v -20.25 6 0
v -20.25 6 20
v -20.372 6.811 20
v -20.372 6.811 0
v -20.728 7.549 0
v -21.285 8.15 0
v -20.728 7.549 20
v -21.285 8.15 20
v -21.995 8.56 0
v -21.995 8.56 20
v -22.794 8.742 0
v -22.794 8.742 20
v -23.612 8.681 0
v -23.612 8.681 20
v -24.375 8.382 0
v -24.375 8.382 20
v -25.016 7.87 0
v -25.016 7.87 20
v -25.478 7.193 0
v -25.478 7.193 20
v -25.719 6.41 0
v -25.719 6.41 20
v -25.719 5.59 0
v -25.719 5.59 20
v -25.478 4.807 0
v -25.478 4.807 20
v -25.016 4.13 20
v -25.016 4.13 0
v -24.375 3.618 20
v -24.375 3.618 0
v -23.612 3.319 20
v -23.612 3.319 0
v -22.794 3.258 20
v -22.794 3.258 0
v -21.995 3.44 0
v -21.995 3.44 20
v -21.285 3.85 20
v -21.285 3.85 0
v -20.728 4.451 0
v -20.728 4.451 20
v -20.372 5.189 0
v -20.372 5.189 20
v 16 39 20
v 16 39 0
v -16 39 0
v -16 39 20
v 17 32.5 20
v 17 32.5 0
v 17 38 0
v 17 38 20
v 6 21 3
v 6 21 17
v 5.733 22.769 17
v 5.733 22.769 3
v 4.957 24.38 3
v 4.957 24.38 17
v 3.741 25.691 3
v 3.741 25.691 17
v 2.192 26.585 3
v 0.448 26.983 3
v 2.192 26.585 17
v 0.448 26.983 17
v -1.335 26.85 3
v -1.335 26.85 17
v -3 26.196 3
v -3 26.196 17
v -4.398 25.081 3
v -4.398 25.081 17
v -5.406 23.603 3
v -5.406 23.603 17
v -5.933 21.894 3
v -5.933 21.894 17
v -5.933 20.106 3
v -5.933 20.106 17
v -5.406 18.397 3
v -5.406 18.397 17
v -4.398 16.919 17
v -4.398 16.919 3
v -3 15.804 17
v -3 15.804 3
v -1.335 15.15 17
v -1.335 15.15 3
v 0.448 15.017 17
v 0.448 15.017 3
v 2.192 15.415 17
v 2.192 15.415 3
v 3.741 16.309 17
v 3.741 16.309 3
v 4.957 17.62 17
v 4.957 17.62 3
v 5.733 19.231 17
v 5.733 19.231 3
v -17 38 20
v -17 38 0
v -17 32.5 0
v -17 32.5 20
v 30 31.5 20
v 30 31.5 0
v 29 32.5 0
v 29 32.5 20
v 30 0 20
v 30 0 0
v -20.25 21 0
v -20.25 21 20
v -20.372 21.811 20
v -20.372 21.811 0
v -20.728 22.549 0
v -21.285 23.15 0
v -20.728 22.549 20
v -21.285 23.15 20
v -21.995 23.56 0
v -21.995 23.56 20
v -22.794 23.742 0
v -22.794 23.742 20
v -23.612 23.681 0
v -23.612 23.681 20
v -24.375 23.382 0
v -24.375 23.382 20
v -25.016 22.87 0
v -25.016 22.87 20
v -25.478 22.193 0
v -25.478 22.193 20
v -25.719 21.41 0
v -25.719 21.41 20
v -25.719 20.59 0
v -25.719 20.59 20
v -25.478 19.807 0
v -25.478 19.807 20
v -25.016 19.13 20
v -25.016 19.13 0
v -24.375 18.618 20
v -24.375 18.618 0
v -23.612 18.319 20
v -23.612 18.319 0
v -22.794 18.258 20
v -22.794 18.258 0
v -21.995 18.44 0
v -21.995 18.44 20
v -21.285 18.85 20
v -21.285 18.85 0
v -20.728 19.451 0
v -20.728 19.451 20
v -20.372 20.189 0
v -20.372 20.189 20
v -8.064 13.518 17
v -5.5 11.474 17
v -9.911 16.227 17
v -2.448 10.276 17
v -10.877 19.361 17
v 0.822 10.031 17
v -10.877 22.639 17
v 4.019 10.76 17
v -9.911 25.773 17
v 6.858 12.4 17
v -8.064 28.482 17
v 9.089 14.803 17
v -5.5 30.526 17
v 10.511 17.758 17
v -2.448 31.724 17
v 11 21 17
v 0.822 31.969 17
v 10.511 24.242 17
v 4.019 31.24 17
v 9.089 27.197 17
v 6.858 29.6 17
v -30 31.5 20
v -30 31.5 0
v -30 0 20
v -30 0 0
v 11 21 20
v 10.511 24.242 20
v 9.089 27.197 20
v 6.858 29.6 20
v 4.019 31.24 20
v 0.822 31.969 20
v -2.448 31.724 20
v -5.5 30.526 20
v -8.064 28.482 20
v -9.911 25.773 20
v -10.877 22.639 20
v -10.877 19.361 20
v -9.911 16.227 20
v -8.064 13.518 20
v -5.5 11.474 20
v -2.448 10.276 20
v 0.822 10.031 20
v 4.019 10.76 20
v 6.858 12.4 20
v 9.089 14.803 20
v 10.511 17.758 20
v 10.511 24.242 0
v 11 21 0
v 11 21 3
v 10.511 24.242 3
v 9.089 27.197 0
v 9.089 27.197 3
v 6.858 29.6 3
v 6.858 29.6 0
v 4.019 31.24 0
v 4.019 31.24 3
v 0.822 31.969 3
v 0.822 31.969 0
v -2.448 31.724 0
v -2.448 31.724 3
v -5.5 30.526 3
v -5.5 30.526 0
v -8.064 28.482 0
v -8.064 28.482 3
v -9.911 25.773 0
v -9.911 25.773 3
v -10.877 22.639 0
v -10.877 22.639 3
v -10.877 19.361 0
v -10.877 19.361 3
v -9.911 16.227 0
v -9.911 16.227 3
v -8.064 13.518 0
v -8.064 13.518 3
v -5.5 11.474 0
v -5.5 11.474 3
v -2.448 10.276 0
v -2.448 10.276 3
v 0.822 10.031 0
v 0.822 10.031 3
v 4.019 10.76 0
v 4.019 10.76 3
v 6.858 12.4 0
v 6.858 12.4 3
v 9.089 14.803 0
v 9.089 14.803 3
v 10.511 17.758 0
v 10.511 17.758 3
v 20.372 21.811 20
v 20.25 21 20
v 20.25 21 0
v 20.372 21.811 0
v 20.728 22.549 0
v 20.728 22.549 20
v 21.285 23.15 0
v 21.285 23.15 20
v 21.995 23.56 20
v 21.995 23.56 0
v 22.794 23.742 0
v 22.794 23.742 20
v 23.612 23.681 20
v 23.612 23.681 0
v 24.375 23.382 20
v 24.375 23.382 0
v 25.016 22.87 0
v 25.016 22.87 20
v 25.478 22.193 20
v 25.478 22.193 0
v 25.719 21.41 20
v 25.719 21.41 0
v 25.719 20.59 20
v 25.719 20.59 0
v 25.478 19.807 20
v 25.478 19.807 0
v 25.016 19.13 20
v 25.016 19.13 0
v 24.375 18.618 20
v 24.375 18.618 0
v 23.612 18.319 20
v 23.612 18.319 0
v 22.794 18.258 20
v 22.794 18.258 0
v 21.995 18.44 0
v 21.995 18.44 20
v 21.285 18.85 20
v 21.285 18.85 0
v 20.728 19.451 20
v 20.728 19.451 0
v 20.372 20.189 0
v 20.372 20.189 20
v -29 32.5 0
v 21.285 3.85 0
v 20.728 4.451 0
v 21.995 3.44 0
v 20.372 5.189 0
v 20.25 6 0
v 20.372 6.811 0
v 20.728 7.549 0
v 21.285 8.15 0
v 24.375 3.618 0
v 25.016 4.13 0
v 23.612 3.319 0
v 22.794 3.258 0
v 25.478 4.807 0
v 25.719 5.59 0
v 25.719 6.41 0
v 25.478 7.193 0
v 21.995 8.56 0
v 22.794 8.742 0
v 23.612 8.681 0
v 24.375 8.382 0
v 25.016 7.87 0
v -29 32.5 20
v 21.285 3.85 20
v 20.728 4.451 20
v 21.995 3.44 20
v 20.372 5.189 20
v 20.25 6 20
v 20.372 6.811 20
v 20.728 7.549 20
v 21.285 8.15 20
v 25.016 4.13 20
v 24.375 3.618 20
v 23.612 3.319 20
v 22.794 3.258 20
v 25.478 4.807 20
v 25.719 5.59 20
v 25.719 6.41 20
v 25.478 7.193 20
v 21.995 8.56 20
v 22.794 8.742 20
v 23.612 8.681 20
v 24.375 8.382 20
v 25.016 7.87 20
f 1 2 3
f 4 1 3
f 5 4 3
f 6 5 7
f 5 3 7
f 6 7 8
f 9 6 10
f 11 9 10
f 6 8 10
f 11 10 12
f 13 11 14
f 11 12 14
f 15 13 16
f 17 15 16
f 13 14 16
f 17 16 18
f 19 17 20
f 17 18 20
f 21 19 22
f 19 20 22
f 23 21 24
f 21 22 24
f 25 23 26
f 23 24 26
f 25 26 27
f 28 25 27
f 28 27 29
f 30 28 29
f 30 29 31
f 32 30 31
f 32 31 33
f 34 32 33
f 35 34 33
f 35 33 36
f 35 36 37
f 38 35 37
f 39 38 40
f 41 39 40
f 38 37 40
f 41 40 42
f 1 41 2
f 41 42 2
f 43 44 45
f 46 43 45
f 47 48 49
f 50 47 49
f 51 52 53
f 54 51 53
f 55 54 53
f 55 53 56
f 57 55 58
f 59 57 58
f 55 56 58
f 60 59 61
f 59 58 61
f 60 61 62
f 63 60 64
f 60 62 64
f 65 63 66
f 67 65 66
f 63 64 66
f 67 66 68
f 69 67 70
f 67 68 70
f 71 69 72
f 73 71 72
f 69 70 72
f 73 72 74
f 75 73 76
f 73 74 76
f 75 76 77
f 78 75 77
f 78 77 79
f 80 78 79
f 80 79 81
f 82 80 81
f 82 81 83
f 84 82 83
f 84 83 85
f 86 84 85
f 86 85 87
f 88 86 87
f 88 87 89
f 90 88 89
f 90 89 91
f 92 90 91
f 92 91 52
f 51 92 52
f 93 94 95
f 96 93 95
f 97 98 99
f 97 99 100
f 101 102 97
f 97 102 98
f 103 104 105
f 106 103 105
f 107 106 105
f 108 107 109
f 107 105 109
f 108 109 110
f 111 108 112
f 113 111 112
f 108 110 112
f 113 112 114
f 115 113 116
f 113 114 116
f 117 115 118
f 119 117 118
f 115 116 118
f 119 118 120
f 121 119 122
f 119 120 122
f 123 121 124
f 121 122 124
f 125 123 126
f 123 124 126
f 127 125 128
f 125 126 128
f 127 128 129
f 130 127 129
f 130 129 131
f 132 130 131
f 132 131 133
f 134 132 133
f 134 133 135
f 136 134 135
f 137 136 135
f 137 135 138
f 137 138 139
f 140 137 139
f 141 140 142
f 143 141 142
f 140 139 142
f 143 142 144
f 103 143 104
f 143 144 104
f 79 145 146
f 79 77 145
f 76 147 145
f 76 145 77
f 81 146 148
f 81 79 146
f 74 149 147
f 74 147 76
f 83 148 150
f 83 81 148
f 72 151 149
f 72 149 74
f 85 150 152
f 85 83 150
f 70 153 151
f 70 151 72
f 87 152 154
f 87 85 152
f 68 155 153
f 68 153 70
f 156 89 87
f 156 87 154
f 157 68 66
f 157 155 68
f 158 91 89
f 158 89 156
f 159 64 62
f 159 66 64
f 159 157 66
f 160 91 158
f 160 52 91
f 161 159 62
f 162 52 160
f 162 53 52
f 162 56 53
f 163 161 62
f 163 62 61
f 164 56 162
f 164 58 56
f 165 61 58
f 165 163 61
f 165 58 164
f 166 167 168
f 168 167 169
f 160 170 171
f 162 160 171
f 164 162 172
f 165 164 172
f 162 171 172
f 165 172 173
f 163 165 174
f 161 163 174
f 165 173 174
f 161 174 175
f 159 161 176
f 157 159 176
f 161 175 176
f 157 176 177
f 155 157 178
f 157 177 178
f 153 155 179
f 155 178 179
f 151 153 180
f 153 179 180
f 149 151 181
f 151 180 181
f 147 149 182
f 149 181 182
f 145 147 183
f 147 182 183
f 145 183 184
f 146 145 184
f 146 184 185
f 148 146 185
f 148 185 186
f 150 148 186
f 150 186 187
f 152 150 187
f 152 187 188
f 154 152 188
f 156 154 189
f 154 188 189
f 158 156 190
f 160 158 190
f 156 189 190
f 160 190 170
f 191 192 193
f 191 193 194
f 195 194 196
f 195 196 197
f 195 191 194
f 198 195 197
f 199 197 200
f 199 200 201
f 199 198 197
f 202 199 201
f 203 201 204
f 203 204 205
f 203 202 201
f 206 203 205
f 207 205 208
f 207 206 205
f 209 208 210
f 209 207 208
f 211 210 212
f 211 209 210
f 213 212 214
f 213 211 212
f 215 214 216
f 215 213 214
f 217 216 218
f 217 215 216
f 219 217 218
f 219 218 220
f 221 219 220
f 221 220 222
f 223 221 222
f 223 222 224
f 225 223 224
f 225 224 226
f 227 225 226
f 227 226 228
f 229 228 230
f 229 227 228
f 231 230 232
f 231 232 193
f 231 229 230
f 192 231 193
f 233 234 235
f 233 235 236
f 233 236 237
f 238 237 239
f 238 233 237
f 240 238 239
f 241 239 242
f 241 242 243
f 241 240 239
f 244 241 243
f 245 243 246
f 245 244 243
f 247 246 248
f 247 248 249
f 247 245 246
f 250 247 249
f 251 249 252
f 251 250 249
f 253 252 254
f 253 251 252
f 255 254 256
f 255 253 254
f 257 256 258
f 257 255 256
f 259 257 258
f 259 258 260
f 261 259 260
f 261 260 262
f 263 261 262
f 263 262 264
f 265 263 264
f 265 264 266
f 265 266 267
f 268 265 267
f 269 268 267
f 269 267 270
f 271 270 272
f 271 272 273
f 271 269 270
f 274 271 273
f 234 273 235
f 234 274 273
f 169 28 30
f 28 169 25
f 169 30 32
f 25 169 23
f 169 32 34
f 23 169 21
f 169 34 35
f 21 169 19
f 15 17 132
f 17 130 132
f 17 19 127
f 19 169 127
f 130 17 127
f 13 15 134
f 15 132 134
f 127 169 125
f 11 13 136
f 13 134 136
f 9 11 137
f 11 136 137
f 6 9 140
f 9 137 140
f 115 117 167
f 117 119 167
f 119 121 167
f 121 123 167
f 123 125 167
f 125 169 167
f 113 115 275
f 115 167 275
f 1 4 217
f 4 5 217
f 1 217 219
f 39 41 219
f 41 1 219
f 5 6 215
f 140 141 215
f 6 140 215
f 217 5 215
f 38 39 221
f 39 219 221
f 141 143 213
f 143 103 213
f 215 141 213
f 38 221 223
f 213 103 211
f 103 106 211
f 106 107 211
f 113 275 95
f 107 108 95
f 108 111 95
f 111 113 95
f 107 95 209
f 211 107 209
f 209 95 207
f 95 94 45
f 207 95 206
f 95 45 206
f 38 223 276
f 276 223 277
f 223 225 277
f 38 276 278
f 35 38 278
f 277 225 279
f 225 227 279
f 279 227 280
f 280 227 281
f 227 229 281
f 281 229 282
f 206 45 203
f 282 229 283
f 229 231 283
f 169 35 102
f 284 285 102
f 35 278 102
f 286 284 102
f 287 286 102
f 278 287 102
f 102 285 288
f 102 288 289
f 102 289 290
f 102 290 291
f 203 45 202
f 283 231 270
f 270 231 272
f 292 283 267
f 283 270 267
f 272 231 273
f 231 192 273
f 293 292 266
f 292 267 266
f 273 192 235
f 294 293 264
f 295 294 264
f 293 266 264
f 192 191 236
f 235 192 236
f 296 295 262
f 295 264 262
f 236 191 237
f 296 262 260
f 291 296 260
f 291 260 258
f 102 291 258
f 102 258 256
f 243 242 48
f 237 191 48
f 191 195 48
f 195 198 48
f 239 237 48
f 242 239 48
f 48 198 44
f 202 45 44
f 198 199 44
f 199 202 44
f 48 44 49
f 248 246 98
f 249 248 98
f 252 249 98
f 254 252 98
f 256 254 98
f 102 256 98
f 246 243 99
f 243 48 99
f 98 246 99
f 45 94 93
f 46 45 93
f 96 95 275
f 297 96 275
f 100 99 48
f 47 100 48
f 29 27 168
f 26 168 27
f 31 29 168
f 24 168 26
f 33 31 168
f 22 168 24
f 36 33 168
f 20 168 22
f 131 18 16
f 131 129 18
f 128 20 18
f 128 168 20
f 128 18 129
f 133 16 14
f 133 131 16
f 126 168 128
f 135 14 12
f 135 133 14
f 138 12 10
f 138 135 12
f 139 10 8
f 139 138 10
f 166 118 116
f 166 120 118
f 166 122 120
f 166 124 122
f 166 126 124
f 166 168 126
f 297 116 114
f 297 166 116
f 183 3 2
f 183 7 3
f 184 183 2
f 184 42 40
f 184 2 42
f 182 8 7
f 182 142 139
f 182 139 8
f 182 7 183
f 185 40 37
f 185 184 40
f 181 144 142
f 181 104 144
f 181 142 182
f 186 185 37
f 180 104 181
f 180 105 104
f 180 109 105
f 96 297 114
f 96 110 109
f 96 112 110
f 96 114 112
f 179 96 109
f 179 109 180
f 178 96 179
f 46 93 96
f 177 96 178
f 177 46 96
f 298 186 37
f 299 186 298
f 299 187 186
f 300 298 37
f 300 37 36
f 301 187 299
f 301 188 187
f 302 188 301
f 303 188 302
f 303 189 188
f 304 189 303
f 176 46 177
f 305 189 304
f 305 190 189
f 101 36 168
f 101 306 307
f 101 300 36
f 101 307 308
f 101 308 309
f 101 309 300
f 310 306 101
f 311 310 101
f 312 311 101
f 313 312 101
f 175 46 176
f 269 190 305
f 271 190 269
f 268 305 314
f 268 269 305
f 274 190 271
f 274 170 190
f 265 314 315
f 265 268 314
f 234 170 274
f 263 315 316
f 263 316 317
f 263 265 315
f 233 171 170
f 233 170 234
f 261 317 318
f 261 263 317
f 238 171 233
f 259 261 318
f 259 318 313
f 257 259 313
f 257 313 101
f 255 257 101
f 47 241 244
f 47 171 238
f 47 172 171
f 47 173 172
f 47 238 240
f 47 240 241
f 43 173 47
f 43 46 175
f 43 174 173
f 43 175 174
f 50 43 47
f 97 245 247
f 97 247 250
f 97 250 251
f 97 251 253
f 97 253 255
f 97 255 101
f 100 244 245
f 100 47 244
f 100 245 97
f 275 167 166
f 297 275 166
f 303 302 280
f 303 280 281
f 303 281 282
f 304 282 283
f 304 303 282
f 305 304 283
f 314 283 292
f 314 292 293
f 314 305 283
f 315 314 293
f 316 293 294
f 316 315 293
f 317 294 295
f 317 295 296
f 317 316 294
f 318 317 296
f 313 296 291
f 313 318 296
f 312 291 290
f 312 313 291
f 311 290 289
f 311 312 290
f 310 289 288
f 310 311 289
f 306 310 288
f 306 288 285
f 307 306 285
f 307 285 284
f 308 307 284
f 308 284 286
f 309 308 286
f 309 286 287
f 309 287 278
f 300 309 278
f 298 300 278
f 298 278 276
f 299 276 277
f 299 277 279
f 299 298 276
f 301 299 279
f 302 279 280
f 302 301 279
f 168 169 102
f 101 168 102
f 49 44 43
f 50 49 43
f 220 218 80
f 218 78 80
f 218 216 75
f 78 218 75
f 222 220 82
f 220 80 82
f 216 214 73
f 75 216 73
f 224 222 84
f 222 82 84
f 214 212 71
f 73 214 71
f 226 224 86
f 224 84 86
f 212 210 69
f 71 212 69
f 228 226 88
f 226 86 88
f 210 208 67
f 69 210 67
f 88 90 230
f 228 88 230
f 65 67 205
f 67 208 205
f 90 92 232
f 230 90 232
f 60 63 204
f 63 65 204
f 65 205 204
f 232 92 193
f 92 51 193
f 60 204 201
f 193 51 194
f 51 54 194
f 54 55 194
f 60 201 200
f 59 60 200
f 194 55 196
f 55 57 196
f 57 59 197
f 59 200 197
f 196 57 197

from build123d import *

# Parameters (mm, degrees)
EXTRUDE_1_DEPTH     = 20
CHAMFER_1_SIZE      = 1
CHAMFER_2_SIZE      = 1
SKETCH_2_R          = 2.75
CUT_EXTRUDE_1_DEPTH = 20
SKETCH_4_R          = 6
CUT_EXTRUDE_2_DEPTH = 20
SKETCH_5_R          = 11
CUT_EXTRUDE_3_DEPTH = 3


with BuildPart() as part:
    # 草图1 → 凸台-拉伸1 (new body)
    with BuildSketch(Plane.XY):
        Polygon((-30, 0), (30, 0), (30, 32.5), (17, 32.5), (17, 39), (-17, 39), (-17, 32.5), (-30, 32.5), align=None)
    extrude(amount=EXTRUDE_1_DEPTH)

    # 倒角1
    chamfer_1_edges = [part.edges().sort_by_distance(p)[0] for p in [
        (17, 39, 10),
    ]]
    chamfer(chamfer_1_edges, length=CHAMFER_1_SIZE)

    # 倒角2
    chamfer_2_edges = [part.edges().sort_by_distance(p)[0] for p in [
        (-30, 32.5, 10),
        (-17, 39, 10),
        (30, 32.5, 10),
    ]]
    chamfer(chamfer_2_edges, length=CHAMFER_2_SIZE)

    # 草图2 → 切除-拉伸1 (cut)
    with BuildSketch(Plane.XY.offset(20)):
        with Locations((-23, 21)):
            Circle(SKETCH_2_R)
        with Locations((-23, 6)):
            Circle(SKETCH_2_R)
    cut_extrude_1 = extrude(amount=-CUT_EXTRUDE_1_DEPTH, mode=Mode.SUBTRACT)

    # 镜向1: 切除-拉伸1 across plane
    add(cut_extrude_1.mirror(Plane(origin=(0, 0, 0), x_dir=(0, 0, 1), z_dir=(1, 0, 0))), mode=Mode.SUBTRACT)

    # 草图4 → 切除-拉伸2 (cut)
    with BuildSketch(Plane.XY.offset(20)):
        with Locations((0, 21)):
            Circle(SKETCH_4_R)
    extrude(amount=-CUT_EXTRUDE_2_DEPTH, mode=Mode.SUBTRACT)

    # 草图5 → 切除-拉伸3 (cut)
    with BuildSketch(Plane.XY.offset(20)):
        with Locations((0, 21)):
            Circle(SKETCH_5_R)
    cut_extrude_3 = extrude(amount=-CUT_EXTRUDE_3_DEPTH, mode=Mode.SUBTRACT)

    # 镜向2: 切除-拉伸3 across plane
    add(cut_extrude_3.mirror(Plane(origin=(0, 0, 10), x_dir=(1, 0, 0), z_dir=(0, 0, -1))), mode=Mode.SUBTRACT)


solid = part.part
